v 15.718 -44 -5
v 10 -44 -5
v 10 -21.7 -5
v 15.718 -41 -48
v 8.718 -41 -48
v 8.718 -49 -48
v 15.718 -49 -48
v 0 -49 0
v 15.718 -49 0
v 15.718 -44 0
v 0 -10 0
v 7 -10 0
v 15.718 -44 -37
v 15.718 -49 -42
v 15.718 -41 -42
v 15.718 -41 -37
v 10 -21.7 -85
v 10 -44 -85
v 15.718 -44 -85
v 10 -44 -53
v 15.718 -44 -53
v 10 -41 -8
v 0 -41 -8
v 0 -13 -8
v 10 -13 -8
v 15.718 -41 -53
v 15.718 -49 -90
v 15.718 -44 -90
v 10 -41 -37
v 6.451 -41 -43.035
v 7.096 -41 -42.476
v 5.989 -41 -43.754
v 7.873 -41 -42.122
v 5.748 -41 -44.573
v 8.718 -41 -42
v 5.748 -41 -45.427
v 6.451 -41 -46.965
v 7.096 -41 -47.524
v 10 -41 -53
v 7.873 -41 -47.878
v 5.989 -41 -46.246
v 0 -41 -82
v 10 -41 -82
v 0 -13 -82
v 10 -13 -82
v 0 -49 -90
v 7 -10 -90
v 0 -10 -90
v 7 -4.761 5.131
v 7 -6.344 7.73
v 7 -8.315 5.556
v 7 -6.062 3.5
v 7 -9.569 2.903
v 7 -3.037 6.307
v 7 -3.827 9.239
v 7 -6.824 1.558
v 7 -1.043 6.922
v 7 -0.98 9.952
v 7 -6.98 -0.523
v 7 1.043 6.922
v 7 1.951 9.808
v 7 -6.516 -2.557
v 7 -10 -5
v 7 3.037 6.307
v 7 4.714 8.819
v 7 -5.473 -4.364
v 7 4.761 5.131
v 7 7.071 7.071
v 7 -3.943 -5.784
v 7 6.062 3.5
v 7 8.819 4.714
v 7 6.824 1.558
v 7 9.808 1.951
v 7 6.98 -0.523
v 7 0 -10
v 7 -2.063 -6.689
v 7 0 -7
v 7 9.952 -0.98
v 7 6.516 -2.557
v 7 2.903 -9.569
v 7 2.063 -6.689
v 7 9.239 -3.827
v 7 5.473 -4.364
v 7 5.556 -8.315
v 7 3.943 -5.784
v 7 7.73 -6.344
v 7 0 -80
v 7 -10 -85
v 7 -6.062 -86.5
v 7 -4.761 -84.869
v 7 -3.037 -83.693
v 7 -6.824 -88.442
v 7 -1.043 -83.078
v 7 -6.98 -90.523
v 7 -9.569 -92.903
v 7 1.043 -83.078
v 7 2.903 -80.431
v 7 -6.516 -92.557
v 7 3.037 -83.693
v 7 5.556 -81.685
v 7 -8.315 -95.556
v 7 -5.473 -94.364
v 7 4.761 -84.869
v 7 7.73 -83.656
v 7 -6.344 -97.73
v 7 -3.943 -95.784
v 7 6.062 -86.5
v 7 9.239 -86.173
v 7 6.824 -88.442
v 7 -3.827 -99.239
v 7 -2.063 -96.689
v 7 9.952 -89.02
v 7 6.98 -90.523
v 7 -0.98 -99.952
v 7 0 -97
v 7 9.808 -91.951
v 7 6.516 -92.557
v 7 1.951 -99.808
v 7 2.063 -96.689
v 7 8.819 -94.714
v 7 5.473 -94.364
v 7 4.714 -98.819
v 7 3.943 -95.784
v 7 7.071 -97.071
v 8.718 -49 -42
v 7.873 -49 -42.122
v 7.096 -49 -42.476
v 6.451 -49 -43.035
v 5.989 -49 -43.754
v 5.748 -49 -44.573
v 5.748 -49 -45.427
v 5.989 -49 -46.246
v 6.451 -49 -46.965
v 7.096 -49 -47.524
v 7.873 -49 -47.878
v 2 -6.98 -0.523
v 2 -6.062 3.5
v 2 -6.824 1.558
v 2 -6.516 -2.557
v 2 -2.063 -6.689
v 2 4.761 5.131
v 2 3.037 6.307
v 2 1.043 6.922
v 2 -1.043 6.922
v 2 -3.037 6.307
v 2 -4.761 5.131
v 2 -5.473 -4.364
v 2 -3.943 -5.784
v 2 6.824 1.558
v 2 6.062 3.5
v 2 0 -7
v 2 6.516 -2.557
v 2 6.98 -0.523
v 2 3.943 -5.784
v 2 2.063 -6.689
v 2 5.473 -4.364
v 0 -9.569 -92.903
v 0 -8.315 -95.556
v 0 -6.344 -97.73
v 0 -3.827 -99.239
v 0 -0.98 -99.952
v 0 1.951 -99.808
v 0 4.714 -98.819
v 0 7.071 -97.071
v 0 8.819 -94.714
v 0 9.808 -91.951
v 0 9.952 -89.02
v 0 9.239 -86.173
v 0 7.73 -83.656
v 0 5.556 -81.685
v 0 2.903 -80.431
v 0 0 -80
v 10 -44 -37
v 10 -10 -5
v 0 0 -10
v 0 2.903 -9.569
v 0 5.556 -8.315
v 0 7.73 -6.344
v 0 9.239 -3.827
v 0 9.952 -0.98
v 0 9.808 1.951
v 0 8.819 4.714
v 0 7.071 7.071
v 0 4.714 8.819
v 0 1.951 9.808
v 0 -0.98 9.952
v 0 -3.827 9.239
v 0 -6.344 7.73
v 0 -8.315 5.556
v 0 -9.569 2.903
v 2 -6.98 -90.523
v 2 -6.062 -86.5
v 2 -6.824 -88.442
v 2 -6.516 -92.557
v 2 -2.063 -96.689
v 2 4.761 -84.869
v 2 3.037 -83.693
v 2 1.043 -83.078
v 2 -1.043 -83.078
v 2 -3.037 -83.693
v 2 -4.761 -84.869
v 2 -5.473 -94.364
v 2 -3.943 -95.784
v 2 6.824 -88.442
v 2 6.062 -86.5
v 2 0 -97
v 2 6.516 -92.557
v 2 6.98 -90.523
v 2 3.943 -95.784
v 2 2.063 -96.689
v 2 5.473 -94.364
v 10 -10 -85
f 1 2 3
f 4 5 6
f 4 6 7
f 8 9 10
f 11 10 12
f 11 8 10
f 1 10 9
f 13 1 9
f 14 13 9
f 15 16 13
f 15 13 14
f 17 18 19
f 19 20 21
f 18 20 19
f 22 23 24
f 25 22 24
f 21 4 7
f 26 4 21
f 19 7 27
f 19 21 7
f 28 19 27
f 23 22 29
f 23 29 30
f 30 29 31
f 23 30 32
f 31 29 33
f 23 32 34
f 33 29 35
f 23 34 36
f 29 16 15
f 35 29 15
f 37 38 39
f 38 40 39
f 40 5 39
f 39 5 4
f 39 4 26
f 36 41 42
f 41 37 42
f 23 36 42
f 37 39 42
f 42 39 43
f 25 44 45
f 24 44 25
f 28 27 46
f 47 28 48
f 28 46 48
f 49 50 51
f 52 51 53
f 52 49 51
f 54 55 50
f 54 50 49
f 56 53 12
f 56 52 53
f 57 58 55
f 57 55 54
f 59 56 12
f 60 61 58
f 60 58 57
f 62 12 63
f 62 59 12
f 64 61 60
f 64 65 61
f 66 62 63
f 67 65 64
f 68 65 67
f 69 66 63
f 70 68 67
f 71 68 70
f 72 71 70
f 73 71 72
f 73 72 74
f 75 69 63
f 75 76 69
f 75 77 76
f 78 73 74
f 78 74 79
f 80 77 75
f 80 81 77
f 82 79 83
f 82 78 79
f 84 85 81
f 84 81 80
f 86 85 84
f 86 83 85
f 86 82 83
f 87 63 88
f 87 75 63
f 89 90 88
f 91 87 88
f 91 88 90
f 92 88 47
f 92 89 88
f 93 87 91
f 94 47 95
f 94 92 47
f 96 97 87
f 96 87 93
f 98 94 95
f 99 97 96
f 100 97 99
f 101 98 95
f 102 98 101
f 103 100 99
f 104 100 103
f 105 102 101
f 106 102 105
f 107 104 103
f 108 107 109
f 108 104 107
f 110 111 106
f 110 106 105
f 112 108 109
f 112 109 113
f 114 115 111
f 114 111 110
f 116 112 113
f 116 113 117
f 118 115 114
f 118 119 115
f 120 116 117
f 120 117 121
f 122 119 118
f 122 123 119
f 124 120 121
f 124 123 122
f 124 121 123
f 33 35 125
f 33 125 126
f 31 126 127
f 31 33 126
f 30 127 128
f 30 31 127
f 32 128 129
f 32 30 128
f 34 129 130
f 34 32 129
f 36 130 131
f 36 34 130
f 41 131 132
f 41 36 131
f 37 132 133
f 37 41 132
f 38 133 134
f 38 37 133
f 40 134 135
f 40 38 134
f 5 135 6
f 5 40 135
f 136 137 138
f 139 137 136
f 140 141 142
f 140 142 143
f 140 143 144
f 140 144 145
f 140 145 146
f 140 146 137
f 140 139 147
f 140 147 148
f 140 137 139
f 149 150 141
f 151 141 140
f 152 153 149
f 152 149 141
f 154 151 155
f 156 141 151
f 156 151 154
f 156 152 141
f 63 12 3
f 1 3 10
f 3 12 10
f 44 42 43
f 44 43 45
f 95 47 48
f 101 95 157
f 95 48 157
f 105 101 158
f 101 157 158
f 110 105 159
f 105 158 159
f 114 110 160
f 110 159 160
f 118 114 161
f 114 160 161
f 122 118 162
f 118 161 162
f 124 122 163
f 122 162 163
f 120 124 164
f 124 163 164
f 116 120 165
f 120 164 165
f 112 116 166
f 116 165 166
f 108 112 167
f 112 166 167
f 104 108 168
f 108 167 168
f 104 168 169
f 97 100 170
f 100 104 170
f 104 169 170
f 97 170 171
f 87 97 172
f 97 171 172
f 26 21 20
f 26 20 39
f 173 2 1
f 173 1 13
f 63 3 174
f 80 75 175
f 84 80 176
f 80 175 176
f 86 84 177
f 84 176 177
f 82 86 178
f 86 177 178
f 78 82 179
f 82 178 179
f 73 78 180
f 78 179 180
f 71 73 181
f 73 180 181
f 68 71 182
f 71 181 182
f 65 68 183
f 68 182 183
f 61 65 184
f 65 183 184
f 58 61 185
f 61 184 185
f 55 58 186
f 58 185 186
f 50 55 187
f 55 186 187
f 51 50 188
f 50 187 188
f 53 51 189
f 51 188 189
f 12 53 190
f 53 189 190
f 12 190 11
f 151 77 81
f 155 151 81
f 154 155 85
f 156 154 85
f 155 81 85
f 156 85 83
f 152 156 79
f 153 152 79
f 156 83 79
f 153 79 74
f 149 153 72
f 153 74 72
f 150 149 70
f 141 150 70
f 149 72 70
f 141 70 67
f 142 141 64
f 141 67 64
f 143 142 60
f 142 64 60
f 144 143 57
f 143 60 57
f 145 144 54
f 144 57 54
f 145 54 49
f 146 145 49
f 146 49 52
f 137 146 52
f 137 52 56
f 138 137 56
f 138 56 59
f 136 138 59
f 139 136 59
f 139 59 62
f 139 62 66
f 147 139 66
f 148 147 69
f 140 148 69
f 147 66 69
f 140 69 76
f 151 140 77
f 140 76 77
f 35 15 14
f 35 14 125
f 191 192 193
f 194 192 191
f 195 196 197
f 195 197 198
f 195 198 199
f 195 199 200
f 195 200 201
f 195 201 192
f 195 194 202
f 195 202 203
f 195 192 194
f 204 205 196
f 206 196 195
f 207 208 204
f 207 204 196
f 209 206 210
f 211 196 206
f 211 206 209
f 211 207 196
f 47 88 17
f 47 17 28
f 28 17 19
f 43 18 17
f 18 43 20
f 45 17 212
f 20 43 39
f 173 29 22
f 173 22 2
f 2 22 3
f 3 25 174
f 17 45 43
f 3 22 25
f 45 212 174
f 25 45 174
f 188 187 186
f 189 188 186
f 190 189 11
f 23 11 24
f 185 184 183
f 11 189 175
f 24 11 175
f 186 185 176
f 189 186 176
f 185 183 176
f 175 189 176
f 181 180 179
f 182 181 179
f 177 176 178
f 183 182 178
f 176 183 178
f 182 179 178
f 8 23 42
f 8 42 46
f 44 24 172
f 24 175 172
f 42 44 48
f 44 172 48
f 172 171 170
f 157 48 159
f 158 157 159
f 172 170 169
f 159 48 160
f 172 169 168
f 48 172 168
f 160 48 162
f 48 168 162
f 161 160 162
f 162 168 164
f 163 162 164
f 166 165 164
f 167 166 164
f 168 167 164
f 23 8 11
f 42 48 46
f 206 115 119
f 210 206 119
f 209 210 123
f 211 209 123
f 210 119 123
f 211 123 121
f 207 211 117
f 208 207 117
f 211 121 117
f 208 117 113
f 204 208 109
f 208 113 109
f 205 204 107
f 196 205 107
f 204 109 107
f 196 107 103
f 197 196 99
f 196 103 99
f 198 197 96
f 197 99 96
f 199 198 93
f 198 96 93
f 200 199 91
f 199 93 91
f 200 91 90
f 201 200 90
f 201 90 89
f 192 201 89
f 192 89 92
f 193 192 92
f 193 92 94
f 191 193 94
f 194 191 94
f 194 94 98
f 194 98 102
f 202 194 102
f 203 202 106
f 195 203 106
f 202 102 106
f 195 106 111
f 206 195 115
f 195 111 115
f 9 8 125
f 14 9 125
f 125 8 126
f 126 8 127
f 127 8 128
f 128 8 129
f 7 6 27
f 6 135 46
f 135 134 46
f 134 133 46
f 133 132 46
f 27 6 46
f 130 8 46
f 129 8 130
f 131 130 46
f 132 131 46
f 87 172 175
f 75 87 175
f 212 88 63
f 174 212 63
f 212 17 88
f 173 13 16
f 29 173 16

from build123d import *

# Parameters (mm, degrees)
SKETCH1_R             = 10
BOSS_EXTRUDE2_DEPTH   = 7
BOSS_EXTRUDE2_2_DEPTH = 7
BOSS_EXTRUDE3_DEPTH   = 17
CUT_EXTRUDE1_START    = -10
CUT_EXTRUDE1_DEPTH    = 10
CUT_EXTRUDE2_DEPTH    = 113.649900133
SKETCH5_R             = 7
CUT_EXTRUDE3_DEPTH    = 5
SKETCH6_W             = 80
SKETCH6_H             = 34
CUT_EXTRUDE4_DEPTH    = 113.649900133
SKETCH7_W             = 80
SKETCH7_H             = 34
SKETCH7_W_2           = 74
SKETCH7_H_2           = 28
BOSS_EXTRUDE4_DEPTH   = 10
CUT_EXTRUDE5_DEPTH    = 113.649900133
SKETCH9_W             = 90
SKETCH9_H             = 5
BOSS_EXTRUDE5_DEPTH   = 8.75
SKETCH10_W            = 16
SKETCH10_H            = 3
BOSS_EXTRUDE6_DEPTH   = 8.717948718
CUT_EXTRUDE6_DEPTH    = 11


with BuildPart() as part:
    # Sketch1 → Boss-Extrude2 (new body)
    with BuildSketch(Plane(origin=(0, 0, 0), x_dir=(0, 0, -1), z_dir=(1, 0, 0))):
        Circle(SKETCH1_R)
    extrude(amount=BOSS_EXTRUDE2_DEPTH)



with BuildPart() as body_2:
    # Sketch1 → Boss-Extrude2 2 (new body)
    with BuildSketch(Plane(origin=(0, 0, 0), x_dir=(0, 0, -1), z_dir=(1, 0, 0))):
        with Locations((90, 0)):
            Circle(SKETCH1_R)
    extrude(amount=BOSS_EXTRUDE2_2_DEPTH)


with BuildPart() as part_1:
    add(part.part)

    add(body_2.part)  # Boss-Extrude3 merges body 2
    # Sketch1<3> → Boss-Extrude3 (add)
    with BuildSketch(Plane(origin=(0, 0, 0), x_dir=(0, 0, -1), z_dir=(1, 0, 0))):
        with BuildLine():
            Line((80, 0), (10, 0))
            ThreePointArc((10, 0), (7.071067812, -7.071067812), (0, -10))
            Line((0, -10), (0, -49))
            Line((0, -49), (90, -49))
            Line((90, -49), (90, -10))
            ThreePointArc((90, -10), (82.928932188, -7.071067812), (80, 0))
        make_face()
    extrude(amount=BOSS_EXTRUDE3_DEPTH)

    # Sketch3 → Cut-Extrude1 (cut)
    with BuildSketch(Plane(origin=(17, 0, 0), x_dir=(0, 0, -1), z_dir=(1, 0, 0)).offset(CUT_EXTRUDE1_START)):
        with BuildLine():
            Line((0, -10), (90, -10))
            ThreePointArc((90, -10), (82.928932188, -7.071067812), (80, 0))
            Line((80, 0), (10, 0))
            ThreePointArc((10, 0), (7.071067812, -7.071067812), (0, -10))
        make_face()
    extrude(amount=CUT_EXTRUDE1_DEPTH, mode=Mode.SUBTRACT)

    # Sketch4 → Cut-Extrude2 (cut, through all)
    with BuildSketch(Plane.XY):
        Polygon((7, -10), (17, -49), (17, -10), align=None)
    extrude(amount=-CUT_EXTRUDE2_DEPTH, mode=Mode.SUBTRACT)

    # Sketch5 → Cut-Extrude3 (cut)
    with BuildSketch(Plane(origin=(7, 0, 0), x_dir=(0, 0, -1), z_dir=(1, 0, 0))):
        Circle(SKETCH5_R)
        with Locations((90, 0)):
            Circle(SKETCH5_R)
    extrude(amount=-CUT_EXTRUDE3_DEPTH, mode=Mode.SUBTRACT)

    # Sketch6 → Cut-Extrude4 (cut, through all)
    with BuildSketch(Plane.ZY):
        with Locations((-45, -27)):
            Rectangle(SKETCH6_W, SKETCH6_H)
    extrude(amount=-CUT_EXTRUDE4_DEPTH, mode=Mode.SUBTRACT)

    # Sketch7 → Boss-Extrude4 (add)
    with BuildSketch(Plane.ZY):
        with Locations((-45, -27)):
            Rectangle(SKETCH7_W, SKETCH7_H)
        with Locations((-45, -27)):
            Rectangle(SKETCH7_W_2, SKETCH7_H_2, mode=Mode.SUBTRACT)
    extrude(amount=-BOSS_EXTRUDE4_DEPTH)

    # Sketch8 → Cut-Extrude5 (cut, through all)
    with BuildSketch(Plane.XY):
        Polygon((15.717948718, -44), (17, -49), (6.967948718, -49), (6.967948718, -44), align=None)
    extrude(amount=-CUT_EXTRUDE5_DEPTH, mode=Mode.SUBTRACT)

    # Sketch9 → Boss-Extrude5 (add)
    with BuildSketch(Plane(origin=(6.967948718, 0, 0), x_dir=(0, 0, -1), z_dir=(1, 0, 0))):
        with Locations((45, -46.5)):
            Rectangle(SKETCH9_W, SKETCH9_H)
    extrude(amount=BOSS_EXTRUDE5_DEPTH)

    # Sketch10 → Boss-Extrude6 (add)
    with BuildSketch(Plane(origin=(15.717948718, 0, 0), x_dir=(0, 0, -1), z_dir=(1, 0, 0))):
        with Locations((45, -42.5)):
            Rectangle(SKETCH10_W, SKETCH10_H)
    extrude(amount=-BOSS_EXTRUDE6_DEPTH)

    # Sketch11 → Cut-Extrude6 (cut)
    with BuildSketch(Plane(origin=(0, -41, 0), x_dir=(1, 0, 0), z_dir=(0, 1, 0))):
        with BuildLine():
            Line((15.717948718, 42), (8.717948718, 42))
            ThreePointArc((8.717948718, 42), (5.717948718, 45), (8.717948718, 48))
            Line((8.717948718, 48), (15.717948718, 48))
            Line((15.717948718, 48), (15.717948718, 42))
        make_face()
    extrude(amount=-CUT_EXTRUDE6_DEPTH, mode=Mode.SUBTRACT)


solid = part_1.part
